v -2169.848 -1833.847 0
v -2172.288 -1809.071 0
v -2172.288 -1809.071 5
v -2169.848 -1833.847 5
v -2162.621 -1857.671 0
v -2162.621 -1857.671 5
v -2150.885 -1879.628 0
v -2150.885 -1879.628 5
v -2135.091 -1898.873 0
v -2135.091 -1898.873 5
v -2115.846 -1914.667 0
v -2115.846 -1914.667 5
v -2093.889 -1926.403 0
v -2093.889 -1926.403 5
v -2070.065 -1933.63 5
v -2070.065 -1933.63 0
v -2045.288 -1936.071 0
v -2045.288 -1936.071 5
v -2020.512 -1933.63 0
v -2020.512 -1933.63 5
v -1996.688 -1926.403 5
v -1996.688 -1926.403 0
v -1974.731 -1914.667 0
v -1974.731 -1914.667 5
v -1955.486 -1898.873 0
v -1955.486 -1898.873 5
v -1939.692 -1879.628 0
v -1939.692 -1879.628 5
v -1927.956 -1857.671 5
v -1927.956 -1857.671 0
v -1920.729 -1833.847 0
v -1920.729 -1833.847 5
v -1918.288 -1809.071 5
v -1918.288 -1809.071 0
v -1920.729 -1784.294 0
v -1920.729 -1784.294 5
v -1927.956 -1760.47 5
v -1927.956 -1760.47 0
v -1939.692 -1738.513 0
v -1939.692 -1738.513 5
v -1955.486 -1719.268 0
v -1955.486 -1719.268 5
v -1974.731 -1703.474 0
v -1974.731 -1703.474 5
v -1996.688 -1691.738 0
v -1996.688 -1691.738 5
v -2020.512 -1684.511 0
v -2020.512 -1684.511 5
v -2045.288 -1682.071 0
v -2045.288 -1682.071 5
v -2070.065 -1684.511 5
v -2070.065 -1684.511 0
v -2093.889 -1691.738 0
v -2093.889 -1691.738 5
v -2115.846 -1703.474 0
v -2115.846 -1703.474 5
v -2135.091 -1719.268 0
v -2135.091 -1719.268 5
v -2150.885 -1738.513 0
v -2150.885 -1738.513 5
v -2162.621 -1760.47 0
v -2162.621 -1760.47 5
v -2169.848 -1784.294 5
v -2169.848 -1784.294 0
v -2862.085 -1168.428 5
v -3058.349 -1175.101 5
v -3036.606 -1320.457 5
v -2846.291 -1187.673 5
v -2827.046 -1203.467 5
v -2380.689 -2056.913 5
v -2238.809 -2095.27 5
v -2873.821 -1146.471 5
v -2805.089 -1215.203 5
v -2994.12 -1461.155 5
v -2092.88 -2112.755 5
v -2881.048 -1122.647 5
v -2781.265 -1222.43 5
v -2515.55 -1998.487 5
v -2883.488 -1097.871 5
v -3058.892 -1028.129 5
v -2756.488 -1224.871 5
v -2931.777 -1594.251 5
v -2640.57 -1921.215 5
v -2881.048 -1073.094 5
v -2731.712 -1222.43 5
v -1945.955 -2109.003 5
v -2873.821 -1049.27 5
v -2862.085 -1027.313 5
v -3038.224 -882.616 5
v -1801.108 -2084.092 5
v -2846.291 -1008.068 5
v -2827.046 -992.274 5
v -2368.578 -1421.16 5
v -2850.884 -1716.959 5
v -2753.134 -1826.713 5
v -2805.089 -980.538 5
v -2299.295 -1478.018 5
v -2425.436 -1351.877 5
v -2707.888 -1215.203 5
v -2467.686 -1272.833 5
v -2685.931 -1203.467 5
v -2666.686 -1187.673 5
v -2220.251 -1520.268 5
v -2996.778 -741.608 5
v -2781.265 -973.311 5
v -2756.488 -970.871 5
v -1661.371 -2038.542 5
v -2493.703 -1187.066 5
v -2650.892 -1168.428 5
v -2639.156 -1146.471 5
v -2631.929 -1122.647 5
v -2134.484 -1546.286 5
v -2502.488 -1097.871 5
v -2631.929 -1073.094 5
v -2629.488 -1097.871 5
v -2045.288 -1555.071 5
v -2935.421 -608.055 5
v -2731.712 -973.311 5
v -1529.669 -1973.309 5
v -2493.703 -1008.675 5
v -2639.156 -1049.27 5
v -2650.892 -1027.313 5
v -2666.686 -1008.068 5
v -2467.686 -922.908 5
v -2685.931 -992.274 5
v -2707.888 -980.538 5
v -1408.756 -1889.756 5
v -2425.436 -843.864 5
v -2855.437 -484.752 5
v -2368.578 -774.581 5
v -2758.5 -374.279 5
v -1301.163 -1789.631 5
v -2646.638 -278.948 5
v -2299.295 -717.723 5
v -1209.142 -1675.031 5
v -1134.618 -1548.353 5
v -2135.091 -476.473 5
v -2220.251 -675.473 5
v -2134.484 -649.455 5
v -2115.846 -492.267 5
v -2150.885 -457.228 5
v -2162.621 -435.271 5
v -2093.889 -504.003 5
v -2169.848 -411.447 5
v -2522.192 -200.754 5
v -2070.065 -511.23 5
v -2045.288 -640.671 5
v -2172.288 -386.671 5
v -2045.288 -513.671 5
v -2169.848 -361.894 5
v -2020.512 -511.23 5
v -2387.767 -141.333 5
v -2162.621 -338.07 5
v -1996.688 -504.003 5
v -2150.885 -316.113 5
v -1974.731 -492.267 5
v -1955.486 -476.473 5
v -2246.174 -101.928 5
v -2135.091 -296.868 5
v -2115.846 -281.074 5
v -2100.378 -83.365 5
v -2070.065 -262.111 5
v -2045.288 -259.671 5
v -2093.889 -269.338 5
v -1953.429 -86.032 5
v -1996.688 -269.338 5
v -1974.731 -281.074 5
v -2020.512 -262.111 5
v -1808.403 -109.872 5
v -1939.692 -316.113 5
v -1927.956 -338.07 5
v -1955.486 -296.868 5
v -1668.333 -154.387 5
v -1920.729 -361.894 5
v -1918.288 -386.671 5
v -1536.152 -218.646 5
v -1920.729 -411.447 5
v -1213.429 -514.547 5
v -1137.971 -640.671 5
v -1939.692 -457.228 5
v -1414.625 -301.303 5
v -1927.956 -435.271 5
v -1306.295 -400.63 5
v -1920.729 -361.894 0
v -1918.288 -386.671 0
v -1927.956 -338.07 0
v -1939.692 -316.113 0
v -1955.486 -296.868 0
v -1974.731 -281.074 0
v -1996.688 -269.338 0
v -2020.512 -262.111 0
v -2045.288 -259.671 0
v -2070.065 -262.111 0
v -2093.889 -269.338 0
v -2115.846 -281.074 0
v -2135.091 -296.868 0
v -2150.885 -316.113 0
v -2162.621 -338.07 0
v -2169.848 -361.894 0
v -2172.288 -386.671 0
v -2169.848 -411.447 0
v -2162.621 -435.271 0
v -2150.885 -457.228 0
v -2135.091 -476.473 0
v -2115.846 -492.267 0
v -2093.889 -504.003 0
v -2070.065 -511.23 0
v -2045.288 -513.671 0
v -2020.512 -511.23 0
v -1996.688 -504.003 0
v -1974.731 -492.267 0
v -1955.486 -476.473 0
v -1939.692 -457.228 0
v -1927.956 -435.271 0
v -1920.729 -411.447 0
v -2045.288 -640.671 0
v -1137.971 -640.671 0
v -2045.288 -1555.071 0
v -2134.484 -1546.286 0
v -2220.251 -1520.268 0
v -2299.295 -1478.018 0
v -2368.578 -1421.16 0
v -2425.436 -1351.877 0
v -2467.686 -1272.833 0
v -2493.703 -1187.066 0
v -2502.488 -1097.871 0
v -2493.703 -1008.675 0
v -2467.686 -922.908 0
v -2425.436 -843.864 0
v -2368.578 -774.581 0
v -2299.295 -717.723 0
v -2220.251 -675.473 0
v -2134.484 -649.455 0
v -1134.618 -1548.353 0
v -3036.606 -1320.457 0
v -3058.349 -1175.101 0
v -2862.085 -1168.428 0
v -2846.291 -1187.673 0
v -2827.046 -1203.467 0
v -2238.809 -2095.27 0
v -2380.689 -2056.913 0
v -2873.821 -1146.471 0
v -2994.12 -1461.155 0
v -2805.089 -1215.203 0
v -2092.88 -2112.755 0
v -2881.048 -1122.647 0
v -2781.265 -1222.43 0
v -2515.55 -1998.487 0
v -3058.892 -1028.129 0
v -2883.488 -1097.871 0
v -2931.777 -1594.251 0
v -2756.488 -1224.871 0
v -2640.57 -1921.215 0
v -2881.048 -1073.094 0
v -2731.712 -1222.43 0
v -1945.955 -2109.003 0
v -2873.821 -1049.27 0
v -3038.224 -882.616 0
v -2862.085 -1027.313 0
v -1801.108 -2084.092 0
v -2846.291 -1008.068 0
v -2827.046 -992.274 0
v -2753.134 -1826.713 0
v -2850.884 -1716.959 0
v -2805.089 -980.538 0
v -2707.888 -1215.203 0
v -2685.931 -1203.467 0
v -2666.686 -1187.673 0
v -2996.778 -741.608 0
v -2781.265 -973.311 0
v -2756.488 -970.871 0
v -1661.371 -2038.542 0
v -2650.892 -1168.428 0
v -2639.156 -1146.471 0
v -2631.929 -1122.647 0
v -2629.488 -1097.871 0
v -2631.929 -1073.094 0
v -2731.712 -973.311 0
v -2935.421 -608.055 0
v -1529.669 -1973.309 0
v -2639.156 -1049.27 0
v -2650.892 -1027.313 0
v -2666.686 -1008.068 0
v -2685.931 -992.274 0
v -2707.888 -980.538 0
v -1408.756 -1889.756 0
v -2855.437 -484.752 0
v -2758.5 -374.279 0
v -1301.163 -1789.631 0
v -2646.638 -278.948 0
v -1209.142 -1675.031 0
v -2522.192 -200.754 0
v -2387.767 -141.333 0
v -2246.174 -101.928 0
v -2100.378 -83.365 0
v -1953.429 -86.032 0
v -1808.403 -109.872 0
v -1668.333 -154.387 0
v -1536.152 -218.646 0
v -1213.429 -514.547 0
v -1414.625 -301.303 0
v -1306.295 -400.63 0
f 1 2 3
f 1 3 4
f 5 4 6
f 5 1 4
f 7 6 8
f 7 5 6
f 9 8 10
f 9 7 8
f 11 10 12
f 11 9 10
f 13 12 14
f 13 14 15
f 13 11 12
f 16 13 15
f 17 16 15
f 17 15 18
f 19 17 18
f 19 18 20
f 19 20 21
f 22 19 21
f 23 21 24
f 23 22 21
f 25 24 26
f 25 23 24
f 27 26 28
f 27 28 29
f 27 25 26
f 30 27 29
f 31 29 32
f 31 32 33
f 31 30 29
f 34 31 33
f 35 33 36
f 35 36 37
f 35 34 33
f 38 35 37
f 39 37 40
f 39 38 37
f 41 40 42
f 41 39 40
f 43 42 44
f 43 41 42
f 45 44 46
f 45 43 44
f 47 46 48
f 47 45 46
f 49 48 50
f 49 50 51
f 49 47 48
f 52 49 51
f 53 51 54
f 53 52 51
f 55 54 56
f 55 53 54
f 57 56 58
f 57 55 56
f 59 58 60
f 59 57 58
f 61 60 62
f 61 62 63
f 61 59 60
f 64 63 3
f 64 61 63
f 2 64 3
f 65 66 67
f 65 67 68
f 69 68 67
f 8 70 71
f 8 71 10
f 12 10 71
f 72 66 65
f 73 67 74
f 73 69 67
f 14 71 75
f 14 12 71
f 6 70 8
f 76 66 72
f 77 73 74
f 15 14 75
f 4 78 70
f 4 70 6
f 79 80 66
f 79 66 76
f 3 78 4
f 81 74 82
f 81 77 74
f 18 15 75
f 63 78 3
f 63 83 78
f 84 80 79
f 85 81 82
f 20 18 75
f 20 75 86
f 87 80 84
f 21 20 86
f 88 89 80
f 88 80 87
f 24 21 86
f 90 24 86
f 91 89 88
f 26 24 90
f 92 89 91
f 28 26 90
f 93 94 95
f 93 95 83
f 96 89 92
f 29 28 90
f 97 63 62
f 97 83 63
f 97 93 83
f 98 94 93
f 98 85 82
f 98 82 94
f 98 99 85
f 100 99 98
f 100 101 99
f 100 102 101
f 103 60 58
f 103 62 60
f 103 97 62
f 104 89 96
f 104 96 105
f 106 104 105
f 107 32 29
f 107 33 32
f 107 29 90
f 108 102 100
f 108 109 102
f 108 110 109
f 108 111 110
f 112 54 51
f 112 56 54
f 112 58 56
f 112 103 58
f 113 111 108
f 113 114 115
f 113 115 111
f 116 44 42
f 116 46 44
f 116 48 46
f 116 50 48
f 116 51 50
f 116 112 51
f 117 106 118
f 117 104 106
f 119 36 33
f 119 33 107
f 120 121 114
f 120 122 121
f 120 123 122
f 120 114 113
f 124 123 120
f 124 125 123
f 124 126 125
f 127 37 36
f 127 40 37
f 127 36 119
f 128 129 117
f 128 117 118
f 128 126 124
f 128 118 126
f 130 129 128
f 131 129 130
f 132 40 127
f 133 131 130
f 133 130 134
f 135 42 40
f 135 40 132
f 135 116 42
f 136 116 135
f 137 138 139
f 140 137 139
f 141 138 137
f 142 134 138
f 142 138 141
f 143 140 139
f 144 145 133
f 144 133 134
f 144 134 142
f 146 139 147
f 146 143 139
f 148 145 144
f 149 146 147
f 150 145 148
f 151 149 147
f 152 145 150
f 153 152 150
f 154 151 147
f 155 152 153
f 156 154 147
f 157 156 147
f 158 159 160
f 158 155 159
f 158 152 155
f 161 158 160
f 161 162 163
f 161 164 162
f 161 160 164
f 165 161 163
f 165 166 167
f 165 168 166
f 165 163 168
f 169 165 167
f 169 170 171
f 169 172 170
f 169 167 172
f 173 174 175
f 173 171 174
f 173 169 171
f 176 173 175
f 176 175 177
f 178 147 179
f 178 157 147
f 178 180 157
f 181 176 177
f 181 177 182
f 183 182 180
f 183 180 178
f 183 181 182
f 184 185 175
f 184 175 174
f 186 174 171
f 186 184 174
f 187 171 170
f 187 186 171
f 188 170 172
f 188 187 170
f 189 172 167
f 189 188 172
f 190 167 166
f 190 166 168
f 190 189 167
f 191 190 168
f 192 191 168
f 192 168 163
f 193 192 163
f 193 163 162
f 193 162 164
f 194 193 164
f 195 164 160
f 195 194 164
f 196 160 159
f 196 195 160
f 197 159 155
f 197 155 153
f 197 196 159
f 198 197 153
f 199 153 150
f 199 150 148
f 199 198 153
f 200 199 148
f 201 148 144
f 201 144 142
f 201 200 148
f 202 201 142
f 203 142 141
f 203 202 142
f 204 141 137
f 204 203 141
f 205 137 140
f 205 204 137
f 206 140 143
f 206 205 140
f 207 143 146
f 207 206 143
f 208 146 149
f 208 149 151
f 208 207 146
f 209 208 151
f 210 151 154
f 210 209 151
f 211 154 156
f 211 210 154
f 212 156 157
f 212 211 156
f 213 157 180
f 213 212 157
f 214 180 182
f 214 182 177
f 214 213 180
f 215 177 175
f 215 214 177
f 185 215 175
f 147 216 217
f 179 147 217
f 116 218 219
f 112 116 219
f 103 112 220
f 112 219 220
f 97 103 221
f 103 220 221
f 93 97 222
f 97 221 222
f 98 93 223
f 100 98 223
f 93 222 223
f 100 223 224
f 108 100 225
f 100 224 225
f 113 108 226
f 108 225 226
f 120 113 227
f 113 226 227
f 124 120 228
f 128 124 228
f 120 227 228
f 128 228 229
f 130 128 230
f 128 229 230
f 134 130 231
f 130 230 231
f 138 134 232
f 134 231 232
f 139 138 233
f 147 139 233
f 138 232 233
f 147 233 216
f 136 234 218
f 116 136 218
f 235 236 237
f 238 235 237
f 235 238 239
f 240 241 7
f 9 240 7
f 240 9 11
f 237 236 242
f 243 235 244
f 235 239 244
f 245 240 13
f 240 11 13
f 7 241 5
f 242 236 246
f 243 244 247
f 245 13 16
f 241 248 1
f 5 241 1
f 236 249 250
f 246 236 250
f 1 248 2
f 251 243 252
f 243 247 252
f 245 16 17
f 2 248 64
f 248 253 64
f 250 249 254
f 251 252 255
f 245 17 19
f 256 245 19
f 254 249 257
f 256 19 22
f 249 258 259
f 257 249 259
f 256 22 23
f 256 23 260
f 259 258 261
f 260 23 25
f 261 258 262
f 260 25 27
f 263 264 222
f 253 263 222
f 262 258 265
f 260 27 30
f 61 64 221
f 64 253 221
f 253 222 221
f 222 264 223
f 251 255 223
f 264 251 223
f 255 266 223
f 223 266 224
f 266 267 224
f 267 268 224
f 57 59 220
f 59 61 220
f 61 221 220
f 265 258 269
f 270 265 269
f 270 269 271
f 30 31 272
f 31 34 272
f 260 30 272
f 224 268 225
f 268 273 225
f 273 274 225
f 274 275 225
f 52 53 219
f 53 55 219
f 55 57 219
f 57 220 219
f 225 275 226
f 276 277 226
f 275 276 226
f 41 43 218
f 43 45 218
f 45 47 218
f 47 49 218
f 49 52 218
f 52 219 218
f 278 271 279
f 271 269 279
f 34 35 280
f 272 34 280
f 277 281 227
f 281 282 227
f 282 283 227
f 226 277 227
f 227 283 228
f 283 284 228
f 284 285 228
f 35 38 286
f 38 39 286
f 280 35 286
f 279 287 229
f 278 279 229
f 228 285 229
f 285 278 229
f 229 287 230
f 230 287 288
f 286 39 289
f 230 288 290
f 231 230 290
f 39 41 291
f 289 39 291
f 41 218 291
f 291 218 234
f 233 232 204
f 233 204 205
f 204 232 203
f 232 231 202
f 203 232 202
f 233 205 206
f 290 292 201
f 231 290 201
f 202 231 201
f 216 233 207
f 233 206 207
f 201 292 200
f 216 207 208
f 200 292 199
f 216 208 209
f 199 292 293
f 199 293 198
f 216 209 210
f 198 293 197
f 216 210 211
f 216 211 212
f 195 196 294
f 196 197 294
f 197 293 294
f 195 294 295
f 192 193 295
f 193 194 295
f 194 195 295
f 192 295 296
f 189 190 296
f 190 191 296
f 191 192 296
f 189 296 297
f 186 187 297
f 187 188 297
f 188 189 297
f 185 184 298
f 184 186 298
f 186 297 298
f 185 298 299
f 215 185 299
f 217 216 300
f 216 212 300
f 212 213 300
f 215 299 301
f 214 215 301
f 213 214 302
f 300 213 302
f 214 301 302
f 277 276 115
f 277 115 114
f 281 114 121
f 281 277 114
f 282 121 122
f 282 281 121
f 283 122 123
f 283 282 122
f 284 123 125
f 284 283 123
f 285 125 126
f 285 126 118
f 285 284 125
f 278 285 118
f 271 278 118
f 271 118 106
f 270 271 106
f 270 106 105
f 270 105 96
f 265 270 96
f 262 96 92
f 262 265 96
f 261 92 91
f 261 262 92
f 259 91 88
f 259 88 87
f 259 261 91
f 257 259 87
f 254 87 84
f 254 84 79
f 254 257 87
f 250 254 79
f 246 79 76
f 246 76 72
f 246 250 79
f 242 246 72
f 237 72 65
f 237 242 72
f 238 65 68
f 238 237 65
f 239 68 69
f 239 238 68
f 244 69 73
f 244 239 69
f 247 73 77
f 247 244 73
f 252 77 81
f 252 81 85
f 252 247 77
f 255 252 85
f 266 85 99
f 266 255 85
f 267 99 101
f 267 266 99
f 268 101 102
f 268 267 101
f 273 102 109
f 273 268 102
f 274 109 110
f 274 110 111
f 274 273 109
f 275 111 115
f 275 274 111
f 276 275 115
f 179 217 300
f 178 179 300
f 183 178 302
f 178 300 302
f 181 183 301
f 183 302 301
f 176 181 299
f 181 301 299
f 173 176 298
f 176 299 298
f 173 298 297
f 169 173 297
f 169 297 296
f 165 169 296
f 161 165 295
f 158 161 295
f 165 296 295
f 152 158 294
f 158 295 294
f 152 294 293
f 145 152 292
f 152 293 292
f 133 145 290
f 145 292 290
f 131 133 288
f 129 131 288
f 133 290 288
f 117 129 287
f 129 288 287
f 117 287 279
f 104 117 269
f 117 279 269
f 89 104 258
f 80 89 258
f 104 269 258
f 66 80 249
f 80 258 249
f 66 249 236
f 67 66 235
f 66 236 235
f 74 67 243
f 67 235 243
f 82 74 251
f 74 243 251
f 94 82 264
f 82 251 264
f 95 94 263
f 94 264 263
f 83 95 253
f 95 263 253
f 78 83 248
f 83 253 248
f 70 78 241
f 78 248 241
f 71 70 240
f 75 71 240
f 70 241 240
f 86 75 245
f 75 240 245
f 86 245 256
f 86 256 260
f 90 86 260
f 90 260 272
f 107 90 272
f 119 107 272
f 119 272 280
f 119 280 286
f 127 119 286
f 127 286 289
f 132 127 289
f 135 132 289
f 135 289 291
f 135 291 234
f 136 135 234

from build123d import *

# Parameters (mm, degrees)
SKETCH1_R           = 127
BOSS_EXTRUDE1_DEPTH = 5


with BuildPart() as part:
    # Sketch1 → Boss-Extrude1 (new body)
    with BuildSketch(Plane.XY):
        with BuildLine():
            Line((-2045.288455612, -640.670506336), (-1137.971443758, -640.670506336))
            ThreePointArc((-1137.971443758, -640.670506336), (-3061.28152044, -1101.624467207), (-1134.61767518, -1548.353280331))
            Line((-1134.61767518, -1548.353280331), (-2045.288455612, -1555.070506336))
            ThreePointArc((-2045.288455612, -1555.070506336), (-2502.488455612, -1097.870506336), (-2045.288455612, -640.670506336))
        make_face()
        with Locations((-2045.288455612, -386.670506336)):
            Circle(SKETCH1_R, mode=Mode.SUBTRACT)
        with Locations((-2756.488455612, -1097.870506336)):
            Circle(SKETCH1_R, mode=Mode.SUBTRACT)
        with Locations(Location((-2045.288455612, -1809.070506336, 0), (0, 0, 180))):
            Circle(SKETCH1_R, mode=Mode.SUBTRACT)
    extrude(amount=BOSS_EXTRUDE1_DEPTH)


solid = part.part
